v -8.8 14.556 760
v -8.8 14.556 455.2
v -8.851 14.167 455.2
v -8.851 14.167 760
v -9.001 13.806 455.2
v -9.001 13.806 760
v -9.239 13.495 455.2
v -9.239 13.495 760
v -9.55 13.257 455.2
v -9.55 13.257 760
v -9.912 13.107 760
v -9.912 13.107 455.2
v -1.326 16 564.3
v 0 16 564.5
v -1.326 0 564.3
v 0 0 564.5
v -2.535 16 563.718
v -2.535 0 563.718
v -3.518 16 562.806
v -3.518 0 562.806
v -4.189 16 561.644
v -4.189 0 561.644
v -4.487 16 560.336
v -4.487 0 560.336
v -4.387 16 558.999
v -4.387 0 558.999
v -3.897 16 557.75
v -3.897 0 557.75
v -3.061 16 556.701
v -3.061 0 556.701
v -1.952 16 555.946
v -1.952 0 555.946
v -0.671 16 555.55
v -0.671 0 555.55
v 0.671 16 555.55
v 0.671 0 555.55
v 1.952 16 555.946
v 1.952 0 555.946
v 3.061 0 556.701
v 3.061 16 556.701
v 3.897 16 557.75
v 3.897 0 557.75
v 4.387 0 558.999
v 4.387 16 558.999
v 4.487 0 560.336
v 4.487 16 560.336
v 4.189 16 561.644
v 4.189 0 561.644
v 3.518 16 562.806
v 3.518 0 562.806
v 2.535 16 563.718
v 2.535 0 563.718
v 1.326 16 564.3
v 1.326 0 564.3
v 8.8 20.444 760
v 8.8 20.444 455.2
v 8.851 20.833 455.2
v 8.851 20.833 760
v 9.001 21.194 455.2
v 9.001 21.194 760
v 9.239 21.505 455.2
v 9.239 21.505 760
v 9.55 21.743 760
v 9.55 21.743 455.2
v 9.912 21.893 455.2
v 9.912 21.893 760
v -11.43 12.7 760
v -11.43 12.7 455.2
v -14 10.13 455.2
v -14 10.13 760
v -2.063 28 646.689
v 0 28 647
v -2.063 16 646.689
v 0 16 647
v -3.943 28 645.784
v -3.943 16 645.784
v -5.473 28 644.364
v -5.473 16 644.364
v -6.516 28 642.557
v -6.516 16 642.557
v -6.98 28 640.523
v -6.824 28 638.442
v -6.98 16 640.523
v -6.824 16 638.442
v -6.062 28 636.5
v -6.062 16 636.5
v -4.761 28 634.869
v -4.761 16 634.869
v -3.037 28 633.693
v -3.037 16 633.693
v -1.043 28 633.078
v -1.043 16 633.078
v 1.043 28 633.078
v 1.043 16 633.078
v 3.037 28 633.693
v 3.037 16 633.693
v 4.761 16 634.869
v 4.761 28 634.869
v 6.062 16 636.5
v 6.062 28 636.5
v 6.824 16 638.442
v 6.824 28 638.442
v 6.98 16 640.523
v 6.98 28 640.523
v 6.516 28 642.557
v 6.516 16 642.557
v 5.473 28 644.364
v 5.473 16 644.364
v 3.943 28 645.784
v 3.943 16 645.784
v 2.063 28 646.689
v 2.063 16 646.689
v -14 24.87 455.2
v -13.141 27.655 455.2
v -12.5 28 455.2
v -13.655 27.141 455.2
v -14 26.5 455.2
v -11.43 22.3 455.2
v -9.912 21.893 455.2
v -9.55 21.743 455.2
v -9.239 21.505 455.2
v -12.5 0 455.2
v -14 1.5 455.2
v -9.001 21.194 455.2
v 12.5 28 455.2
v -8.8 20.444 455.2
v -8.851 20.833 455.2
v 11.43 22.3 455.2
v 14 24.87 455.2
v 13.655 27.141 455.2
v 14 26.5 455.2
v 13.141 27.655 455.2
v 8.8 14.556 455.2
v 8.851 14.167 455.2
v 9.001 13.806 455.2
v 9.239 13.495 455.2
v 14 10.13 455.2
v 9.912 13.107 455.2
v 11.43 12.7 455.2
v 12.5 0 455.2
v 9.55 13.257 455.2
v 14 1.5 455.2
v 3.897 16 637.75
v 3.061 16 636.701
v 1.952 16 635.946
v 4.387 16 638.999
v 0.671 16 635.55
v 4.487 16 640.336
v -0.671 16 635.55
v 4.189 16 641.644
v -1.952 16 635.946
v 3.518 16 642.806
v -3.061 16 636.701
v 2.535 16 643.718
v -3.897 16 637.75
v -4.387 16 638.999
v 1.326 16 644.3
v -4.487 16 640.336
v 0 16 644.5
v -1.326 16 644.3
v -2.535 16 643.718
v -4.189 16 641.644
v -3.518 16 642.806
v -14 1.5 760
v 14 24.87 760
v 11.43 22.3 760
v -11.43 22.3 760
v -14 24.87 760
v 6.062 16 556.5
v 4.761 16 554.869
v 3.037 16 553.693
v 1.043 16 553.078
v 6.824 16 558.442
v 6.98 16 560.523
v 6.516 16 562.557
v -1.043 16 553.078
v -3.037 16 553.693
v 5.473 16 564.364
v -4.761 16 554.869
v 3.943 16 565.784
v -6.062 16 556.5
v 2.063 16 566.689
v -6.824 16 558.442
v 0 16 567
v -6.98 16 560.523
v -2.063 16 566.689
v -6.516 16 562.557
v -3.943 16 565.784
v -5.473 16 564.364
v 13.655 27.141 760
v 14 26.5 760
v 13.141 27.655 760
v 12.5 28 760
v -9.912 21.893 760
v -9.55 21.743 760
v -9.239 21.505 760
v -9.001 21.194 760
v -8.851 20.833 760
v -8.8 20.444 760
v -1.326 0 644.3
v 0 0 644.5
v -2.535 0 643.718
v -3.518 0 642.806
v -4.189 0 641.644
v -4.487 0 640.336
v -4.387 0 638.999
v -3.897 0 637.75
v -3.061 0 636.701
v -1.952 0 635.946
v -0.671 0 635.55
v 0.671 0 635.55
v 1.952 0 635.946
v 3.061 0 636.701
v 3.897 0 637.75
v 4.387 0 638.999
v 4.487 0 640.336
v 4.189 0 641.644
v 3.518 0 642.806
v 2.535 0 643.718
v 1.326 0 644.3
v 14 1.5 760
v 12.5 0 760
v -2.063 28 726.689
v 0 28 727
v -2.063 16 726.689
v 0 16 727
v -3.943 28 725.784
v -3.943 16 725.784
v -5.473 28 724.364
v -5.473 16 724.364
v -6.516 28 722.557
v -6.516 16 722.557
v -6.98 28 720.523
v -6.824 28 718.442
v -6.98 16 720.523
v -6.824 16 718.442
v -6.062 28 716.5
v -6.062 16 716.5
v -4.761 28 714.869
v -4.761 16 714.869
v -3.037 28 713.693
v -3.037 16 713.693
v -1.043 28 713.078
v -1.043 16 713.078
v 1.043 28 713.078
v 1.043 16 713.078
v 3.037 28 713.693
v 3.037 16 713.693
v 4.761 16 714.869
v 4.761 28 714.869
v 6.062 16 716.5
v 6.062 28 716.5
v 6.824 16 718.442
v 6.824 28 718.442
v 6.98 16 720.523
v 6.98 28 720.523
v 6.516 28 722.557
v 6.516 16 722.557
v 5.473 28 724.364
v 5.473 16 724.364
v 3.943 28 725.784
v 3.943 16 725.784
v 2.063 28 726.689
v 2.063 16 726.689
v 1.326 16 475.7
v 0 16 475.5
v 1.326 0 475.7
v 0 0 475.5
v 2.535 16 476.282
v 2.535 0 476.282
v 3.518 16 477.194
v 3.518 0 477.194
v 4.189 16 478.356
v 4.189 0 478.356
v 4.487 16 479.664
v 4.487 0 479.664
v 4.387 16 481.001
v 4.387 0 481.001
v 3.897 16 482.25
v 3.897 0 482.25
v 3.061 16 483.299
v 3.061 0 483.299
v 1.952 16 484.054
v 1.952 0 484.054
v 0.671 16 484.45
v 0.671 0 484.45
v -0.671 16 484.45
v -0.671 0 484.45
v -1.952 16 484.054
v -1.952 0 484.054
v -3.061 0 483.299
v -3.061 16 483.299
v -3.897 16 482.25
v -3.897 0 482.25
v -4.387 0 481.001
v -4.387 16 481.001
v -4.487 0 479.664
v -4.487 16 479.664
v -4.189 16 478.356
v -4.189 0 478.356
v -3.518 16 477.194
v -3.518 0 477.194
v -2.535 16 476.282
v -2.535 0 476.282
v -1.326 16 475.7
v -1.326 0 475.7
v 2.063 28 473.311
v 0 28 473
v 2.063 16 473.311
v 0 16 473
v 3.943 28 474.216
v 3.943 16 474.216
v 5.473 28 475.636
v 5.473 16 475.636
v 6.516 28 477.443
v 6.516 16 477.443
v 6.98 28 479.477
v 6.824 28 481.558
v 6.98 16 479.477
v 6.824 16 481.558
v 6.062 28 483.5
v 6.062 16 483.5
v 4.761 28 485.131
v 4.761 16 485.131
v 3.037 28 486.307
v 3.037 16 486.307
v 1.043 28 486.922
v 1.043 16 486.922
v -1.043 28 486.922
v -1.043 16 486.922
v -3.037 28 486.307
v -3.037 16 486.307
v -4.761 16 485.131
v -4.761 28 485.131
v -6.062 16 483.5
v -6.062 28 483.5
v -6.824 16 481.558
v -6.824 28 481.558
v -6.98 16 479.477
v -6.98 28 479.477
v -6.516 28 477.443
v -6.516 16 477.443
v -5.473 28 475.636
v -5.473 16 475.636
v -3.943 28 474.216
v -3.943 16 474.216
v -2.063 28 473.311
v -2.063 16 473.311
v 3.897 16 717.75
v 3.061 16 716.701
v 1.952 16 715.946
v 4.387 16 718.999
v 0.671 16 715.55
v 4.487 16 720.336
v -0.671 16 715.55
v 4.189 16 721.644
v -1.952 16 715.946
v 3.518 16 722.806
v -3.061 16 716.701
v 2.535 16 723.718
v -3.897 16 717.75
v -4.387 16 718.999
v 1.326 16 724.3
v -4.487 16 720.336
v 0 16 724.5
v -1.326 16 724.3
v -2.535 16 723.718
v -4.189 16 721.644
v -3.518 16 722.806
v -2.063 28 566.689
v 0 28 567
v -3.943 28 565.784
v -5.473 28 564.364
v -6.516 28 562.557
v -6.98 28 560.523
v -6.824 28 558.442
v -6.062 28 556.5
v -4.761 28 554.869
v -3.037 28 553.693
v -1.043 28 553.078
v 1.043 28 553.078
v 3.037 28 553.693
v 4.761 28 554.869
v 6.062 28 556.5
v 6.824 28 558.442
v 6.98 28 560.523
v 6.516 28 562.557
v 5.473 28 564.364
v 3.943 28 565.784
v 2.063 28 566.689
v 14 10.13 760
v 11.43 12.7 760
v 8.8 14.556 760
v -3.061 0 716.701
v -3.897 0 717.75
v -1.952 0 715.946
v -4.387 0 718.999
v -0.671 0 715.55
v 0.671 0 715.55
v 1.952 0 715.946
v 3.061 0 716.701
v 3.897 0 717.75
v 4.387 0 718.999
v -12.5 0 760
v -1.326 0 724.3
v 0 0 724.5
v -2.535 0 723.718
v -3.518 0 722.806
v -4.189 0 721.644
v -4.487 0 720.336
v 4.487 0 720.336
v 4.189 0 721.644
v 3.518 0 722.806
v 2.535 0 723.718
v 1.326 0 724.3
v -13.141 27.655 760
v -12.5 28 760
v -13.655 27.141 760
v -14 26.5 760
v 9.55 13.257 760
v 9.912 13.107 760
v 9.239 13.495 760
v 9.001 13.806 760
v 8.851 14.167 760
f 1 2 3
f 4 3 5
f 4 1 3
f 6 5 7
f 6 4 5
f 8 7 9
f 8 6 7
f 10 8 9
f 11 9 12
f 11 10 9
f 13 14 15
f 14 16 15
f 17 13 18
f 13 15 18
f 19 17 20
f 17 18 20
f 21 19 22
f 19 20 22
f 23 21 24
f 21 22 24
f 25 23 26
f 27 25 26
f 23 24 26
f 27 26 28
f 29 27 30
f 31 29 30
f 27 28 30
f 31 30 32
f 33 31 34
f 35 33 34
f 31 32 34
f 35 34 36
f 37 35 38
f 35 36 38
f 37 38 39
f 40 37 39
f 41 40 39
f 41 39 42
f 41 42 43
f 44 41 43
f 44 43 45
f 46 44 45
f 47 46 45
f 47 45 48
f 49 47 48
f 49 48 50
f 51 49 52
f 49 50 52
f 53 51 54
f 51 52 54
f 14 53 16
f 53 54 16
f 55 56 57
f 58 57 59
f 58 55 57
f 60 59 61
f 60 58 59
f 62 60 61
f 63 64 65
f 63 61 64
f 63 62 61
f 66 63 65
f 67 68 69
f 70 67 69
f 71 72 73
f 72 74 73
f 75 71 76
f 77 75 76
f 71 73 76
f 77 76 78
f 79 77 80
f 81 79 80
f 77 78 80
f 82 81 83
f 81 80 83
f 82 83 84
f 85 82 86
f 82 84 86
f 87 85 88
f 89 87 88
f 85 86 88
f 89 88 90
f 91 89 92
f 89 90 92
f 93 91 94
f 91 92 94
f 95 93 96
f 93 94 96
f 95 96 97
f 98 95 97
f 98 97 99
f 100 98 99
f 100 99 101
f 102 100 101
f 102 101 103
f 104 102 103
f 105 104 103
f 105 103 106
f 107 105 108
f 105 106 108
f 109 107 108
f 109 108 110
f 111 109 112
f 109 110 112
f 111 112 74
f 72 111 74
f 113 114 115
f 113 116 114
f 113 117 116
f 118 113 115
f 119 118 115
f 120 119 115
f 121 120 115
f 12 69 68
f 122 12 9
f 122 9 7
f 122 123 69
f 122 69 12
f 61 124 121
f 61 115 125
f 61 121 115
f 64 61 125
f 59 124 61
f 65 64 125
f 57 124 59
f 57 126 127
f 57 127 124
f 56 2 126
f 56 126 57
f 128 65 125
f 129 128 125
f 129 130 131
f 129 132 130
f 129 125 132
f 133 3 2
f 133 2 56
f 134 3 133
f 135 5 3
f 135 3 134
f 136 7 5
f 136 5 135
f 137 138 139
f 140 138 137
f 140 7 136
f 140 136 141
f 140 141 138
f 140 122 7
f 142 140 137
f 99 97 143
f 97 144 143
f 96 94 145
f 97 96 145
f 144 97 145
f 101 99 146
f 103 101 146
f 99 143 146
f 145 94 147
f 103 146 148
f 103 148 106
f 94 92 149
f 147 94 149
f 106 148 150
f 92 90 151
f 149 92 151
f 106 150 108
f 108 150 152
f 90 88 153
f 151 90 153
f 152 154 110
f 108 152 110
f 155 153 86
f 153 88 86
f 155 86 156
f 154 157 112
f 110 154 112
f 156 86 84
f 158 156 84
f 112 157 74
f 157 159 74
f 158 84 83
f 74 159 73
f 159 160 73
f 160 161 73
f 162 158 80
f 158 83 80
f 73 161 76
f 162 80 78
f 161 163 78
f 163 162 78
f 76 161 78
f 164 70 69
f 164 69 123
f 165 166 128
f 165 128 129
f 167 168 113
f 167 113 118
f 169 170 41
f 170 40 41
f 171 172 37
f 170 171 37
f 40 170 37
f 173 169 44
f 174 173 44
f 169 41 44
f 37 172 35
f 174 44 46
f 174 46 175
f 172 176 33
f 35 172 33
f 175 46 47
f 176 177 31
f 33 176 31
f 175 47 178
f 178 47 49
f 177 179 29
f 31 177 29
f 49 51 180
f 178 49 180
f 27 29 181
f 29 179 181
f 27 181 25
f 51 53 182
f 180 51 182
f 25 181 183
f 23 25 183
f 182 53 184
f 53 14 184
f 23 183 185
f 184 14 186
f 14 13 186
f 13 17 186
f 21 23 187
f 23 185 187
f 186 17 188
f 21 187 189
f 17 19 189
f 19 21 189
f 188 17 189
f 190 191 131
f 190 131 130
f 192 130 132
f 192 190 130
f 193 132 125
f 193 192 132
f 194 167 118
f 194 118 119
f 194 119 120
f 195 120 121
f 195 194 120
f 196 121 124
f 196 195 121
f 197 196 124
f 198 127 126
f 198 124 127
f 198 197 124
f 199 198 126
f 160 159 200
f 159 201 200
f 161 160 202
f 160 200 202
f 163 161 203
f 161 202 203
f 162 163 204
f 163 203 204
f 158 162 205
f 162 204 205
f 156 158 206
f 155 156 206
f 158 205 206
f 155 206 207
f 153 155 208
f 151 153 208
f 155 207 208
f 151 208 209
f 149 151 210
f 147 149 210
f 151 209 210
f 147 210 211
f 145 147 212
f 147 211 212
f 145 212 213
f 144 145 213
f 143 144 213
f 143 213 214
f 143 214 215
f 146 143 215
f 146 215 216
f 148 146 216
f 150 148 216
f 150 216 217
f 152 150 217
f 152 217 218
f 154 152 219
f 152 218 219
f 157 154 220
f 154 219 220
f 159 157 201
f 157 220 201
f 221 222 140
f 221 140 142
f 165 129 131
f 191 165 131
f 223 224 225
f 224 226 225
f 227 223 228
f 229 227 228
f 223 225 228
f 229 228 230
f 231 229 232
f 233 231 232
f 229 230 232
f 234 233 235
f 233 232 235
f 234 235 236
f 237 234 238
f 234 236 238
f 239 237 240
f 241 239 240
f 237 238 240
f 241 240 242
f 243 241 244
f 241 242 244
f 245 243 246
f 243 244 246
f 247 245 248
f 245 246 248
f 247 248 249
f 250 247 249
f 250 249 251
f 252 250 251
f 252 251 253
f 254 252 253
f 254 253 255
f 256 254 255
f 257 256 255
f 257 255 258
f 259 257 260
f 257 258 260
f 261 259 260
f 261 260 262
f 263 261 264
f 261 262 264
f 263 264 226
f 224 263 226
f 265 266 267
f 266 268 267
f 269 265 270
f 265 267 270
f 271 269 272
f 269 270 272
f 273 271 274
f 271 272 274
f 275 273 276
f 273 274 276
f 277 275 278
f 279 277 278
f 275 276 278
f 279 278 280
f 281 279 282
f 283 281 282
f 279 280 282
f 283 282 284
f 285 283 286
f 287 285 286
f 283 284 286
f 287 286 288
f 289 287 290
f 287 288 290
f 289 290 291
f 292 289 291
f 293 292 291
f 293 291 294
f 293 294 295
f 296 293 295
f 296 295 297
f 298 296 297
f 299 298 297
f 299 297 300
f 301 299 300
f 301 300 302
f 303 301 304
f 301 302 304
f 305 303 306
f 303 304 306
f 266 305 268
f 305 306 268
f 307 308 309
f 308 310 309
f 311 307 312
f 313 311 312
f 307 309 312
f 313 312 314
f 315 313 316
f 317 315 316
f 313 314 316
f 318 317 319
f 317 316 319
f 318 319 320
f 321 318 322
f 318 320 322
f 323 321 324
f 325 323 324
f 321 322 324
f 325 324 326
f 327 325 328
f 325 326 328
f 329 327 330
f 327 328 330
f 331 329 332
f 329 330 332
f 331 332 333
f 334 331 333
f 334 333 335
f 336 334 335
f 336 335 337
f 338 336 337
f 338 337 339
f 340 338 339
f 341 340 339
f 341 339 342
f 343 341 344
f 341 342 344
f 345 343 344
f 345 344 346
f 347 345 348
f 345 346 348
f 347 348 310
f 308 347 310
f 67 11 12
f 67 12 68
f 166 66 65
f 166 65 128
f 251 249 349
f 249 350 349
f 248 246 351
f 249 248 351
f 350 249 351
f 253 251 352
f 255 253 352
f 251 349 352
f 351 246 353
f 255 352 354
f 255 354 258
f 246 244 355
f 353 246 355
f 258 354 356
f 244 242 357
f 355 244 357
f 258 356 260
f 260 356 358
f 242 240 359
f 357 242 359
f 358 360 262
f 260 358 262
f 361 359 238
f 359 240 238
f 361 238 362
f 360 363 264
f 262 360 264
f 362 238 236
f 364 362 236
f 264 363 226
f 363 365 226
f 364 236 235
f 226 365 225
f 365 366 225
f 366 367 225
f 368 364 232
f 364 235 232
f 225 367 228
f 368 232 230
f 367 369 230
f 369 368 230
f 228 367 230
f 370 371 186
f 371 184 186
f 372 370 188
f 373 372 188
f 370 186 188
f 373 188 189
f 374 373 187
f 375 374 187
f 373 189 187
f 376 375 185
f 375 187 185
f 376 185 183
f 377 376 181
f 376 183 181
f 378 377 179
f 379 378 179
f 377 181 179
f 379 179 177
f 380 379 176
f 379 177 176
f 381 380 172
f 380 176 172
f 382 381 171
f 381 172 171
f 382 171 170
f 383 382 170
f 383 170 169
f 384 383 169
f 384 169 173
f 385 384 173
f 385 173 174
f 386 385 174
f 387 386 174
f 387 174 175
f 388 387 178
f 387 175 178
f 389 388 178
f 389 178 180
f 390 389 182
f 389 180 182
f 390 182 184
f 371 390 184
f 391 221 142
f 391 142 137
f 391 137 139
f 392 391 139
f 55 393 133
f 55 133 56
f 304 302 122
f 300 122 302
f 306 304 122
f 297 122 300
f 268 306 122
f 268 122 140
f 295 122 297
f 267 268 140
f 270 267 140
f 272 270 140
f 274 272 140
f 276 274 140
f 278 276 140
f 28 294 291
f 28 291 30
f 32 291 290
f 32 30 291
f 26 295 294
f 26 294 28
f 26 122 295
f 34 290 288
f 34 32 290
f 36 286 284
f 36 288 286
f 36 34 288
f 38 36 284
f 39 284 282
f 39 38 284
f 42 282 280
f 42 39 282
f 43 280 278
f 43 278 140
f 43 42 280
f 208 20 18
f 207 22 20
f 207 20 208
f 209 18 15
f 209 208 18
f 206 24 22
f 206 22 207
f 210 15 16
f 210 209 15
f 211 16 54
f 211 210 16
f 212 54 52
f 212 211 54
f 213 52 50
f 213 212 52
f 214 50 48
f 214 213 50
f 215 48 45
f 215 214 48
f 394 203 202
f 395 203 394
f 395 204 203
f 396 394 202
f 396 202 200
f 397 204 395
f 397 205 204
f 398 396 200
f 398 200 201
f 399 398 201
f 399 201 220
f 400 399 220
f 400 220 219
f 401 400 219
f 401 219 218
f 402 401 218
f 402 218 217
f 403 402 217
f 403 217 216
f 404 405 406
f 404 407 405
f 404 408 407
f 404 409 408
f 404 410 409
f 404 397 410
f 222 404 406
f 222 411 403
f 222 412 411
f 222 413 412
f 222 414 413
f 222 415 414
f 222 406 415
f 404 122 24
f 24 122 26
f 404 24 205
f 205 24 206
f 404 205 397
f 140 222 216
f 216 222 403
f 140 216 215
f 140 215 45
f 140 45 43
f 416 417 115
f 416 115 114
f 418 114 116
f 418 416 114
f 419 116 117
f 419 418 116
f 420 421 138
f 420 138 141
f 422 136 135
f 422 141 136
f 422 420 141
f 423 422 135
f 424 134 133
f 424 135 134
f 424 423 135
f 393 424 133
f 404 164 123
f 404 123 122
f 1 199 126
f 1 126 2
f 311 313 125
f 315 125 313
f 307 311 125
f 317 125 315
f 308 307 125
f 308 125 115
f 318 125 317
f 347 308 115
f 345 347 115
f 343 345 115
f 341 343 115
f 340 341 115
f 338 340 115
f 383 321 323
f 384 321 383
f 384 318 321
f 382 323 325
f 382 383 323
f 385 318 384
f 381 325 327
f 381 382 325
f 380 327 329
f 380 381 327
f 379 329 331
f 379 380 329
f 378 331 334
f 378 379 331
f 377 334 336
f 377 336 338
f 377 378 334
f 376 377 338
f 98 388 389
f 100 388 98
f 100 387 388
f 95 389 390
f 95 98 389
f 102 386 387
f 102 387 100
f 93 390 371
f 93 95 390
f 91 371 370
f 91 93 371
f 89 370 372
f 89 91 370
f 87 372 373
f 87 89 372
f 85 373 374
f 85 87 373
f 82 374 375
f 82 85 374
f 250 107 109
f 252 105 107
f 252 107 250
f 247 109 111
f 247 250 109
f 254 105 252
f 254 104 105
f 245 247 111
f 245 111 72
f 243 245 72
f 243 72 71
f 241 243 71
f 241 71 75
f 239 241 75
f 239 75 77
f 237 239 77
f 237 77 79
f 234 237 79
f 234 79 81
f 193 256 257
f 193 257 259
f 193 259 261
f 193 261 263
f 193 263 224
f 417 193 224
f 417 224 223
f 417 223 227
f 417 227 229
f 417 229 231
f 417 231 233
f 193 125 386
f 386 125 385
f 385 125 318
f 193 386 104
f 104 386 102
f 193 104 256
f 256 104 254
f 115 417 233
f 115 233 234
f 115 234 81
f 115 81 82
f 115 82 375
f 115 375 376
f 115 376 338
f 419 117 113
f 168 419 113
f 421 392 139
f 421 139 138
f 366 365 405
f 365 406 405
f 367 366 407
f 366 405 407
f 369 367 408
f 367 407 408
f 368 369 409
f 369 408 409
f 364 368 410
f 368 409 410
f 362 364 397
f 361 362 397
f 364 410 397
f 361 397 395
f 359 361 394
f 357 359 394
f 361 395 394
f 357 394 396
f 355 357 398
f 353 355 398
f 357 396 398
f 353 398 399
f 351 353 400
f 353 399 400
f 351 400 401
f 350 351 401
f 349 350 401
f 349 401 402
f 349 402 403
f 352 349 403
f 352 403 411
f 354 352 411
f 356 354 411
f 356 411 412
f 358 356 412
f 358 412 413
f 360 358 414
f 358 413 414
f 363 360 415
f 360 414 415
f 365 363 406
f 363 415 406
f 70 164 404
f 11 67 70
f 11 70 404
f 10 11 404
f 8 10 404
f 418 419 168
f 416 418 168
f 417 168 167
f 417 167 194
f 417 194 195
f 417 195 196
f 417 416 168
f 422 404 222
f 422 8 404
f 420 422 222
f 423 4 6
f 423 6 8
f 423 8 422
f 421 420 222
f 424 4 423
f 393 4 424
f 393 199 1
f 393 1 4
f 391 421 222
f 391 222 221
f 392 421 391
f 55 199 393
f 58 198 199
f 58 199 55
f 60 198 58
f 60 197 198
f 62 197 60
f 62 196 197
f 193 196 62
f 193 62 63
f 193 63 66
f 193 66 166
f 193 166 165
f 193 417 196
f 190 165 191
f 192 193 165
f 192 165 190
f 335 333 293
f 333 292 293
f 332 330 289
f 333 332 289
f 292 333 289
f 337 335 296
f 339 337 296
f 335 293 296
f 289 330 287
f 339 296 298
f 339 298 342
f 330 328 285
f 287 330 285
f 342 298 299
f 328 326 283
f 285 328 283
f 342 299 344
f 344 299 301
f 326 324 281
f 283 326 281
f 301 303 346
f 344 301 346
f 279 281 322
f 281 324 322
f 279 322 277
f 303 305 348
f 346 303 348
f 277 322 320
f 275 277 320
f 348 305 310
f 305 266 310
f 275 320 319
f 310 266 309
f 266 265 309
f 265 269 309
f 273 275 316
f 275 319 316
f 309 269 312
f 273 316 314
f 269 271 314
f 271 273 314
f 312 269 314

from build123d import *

# Parameters (mm, degrees)
BOSS_EXTRUDE1_DEPTH     = 760
LPATTERN1_COUNT         = 2
LPATTERN1_PITCH         = 80
LPATTERN2_COUNT         = 9
LPATTERN2_PITCH         = 160
CUT_EXTRUDE1_DEPTH      = 40
CUT_EXTRUDE1_DEPTH_BACK = 20
SKETCH5_W               = 307.175258626
SKETCH5_H               = 1220.849909684


with BuildPart() as part:
    # Sketch1 → Boss-Extrude1 (new, symmetric)
    with BuildSketch(Plane.XY):
        with BuildLine():
            Line((-9.911771432, 13.106808119), (-11.43, 12.7))
            Line((-11.43, 12.7), (-14, 10.13))
            Line((-14, 10.13), (-14, 1.5))
            Line((-14, 1.5), (-12.5, 0))
            Line((-12.5, 0), (12.5, 0))
            Line((12.5, 0), (14, 1.5))
            Line((14, 1.5), (14, 10.13))
            Line((14, 10.13), (11.43, 12.7))
            Line((11.43, 12.7), (9.911771432, 13.106808119))
            ThreePointArc((9.911771432, 13.106808119), (9.10996999, 13.642554715), (8.8, 14.555696858))
            Line((8.8, 14.555696858), (8.8, 20.444303142))
            ThreePointArc((8.8, 20.444303142), (9.10996999, 21.357445285), (9.911771432, 21.893191881))
            Line((9.911771432, 21.893191881), (11.43, 22.3))
            Line((11.43, 22.3), (14, 24.87))
            Line((14, 24.87), (14, 26.5))
            ThreePointArc((14, 26.5), (13.416985894, 27.416985894), (12.5, 28))
            Line((12.5, 28), (-12.5, 28))
            ThreePointArc((-12.5, 28), (-13.416985894, 27.416985894), (-14, 26.5))
            Line((-14, 26.5), (-14, 24.87))
            Line((-14, 24.87), (-11.43, 22.3))
            Line((-11.43, 22.3), (-9.911771432, 21.893191881))
            ThreePointArc((-9.911771432, 21.893191881), (-9.10996999, 21.357445285), (-8.8, 20.444303142))
            Line((-8.8, 20.444303142), (-8.8, 14.555696858))
            ThreePointArc((-8.8, 14.555696858), (-9.10996999, 13.642554715), (-9.911771432, 13.106808119))
        make_face()
    extrude(amount=BOSS_EXTRUDE1_DEPTH, both=True)

    # Sketch2 → Cut-Revolve1 (revolve, cut)
    with BuildSketch(Plane(origin=(0, 0, 0), x_dir=(0, 0, -1), z_dir=(1, 0, 0)), mode=Mode.PRIVATE) as cut_revolve1_sk:
        Polygon((-720, 28), (-713, 28), (-713, 16), (-715.5, 16), (-715.5, 0), (-720, 0), align=None)
    cut_revolve1 = revolve(cut_revolve1_sk.sketch.rotate(Axis((0, 28, 720), (0, -1, 0)), 180), axis=Axis((0, 28, 720), (0, -1, 0)), mode=Mode.SUBTRACT)

    # LPattern1: Cut-Revolve1 ×2
    with Locations(*[(0, 0, -i * LPATTERN1_PITCH) for i in range(1, LPATTERN1_COUNT)]):
        add(cut_revolve1, mode=Mode.SUBTRACT)

    # Mirror1: Cut-Revolve1 across plane
    add(cut_revolve1.mirror(Plane.XY), mode=Mode.SUBTRACT)

    # Mirror1 copy 1 sketch → Mirror1 copy 1 (revolve, cut)
    with BuildSketch(Plane(origin=(0, 0, 80), x_dir=(0, 0, 1), z_dir=(1, 0, 0))):
        Polygon((-720, -28), (-713, -28), (-713, -16), (-715.5, -16), (-715.5, 0), (-720, 0), align=None)
    revolve(axis=Axis((0, 28, -640), (0, 1, 0)), mode=Mode.SUBTRACT)

    # LPattern2: Cut-Revolve1 ×9
    with Locations(*[(0, 0, -i * LPATTERN2_PITCH) for i in range(1, LPATTERN2_COUNT)]):
        add(cut_revolve1, mode=Mode.SUBTRACT)

    # LPattern2 copy 1 sketch → LPattern2 copy 1 (revolve, cut)
    with BuildSketch(Plane(origin=(0, 0, -240), x_dir=(0, 0, -1), z_dir=(1, 0, 0))):
        Polygon((-720, 28), (-713, 28), (-713, 16), (-715.5, 16), (-715.5, 0), (-720, 0), align=None)
    revolve(axis=Axis((0, 28, 480), (0, -1, 0)), mode=Mode.SUBTRACT)

    # LPattern2 copy 2 sketch → LPattern2 copy 2 (revolve, cut)
    with BuildSketch(Plane(origin=(0, 0, -400), x_dir=(0, 0, -1), z_dir=(1, 0, 0))):
        Polygon((-720, 28), (-713, 28), (-713, 16), (-715.5, 16), (-715.5, 0), (-720, 0), align=None)
    revolve(axis=Axis((0, 28, 320), (0, -1, 0)), mode=Mode.SUBTRACT)

    # LPattern2 copy 3 sketch → LPattern2 copy 3 (revolve, cut)
    with BuildSketch(Plane(origin=(0, 0, -560), x_dir=(0, 0, -1), z_dir=(1, 0, 0))):
        Polygon((-720, 28), (-713, 28), (-713, 16), (-715.5, 16), (-715.5, 0), (-720, 0), align=None)
    revolve(axis=Axis((0, 28, 160), (0, -1, 0)), mode=Mode.SUBTRACT)

    # LPattern2 copy 4 sketch → LPattern2 copy 4 (revolve, cut)
    with BuildSketch(Plane(origin=(0, 0, -720), x_dir=(0, 0, -1), z_dir=(1, 0, 0))):
        Polygon((-720, 28), (-713, 28), (-713, 16), (-715.5, 16), (-715.5, 0), (-720, 0), align=None)
    revolve(axis=Axis((0, 28, 0), (0, -1, 0)), mode=Mode.SUBTRACT)

    # LPattern2 copy 5 sketch → LPattern2 copy 5 (revolve, cut)
    with BuildSketch(Plane(origin=(0, 0, -880), x_dir=(0, 0, -1), z_dir=(1, 0, 0))):
        Polygon((-720, 28), (-713, 28), (-713, 16), (-715.5, 16), (-715.5, 0), (-720, 0), align=None)
    revolve(axis=Axis((0, 28, -160), (0, -1, 0)), mode=Mode.SUBTRACT)

    # LPattern2 copy 6 sketch → LPattern2 copy 6 (revolve, cut)
    with BuildSketch(Plane(origin=(0, 0, -1040), x_dir=(0, 0, -1), z_dir=(1, 0, 0))):
        Polygon((-720, 28), (-713, 28), (-713, 16), (-715.5, 16), (-715.5, 0), (-720, 0), align=None)
    revolve(axis=Axis((0, 28, -320), (0, -1, 0)), mode=Mode.SUBTRACT)

    # LPattern2 copy 7 sketch → LPattern2 copy 7 (revolve, cut)
    with BuildSketch(Plane(origin=(0, 0, -1200), x_dir=(0, 0, -1), z_dir=(1, 0, 0))):
        Polygon((-720, 28), (-713, 28), (-713, 16), (-715.5, 16), (-715.5, 0), (-720, 0), align=None)
    revolve(axis=Axis((0, 28, -480), (0, -1, 0)), mode=Mode.SUBTRACT)

    # LPattern2 copy 8 sketch → LPattern2 copy 8 (revolve, cut)
    with BuildSketch(Plane(origin=(0, 0, -1360), x_dir=(0, 0, -1), z_dir=(1, 0, 0))):
        Polygon((-720, 28), (-713, 28), (-713, 16), (-715.5, 16), (-715.5, 0), (-720, 0), align=None)
    revolve(axis=Axis((0, 28, -640), (0, -1, 0)), mode=Mode.SUBTRACT)

    # Sketch5 → Cut-Extrude1 (cut, two sides: drawn at the far end of the back side and taken through both)
    with BuildSketch(Plane(origin=(0, 0, 0), x_dir=(1, 0, 0), z_dir=(0, 1, 0)).offset(-CUT_EXTRUDE1_DEPTH_BACK)):
        with Locations((39.746319407, 155.224954842)):
            Rectangle(SKETCH5_W, SKETCH5_H)
    extrude(amount=CUT_EXTRUDE1_DEPTH + CUT_EXTRUDE1_DEPTH_BACK, mode=Mode.SUBTRACT)


solid = part.part
